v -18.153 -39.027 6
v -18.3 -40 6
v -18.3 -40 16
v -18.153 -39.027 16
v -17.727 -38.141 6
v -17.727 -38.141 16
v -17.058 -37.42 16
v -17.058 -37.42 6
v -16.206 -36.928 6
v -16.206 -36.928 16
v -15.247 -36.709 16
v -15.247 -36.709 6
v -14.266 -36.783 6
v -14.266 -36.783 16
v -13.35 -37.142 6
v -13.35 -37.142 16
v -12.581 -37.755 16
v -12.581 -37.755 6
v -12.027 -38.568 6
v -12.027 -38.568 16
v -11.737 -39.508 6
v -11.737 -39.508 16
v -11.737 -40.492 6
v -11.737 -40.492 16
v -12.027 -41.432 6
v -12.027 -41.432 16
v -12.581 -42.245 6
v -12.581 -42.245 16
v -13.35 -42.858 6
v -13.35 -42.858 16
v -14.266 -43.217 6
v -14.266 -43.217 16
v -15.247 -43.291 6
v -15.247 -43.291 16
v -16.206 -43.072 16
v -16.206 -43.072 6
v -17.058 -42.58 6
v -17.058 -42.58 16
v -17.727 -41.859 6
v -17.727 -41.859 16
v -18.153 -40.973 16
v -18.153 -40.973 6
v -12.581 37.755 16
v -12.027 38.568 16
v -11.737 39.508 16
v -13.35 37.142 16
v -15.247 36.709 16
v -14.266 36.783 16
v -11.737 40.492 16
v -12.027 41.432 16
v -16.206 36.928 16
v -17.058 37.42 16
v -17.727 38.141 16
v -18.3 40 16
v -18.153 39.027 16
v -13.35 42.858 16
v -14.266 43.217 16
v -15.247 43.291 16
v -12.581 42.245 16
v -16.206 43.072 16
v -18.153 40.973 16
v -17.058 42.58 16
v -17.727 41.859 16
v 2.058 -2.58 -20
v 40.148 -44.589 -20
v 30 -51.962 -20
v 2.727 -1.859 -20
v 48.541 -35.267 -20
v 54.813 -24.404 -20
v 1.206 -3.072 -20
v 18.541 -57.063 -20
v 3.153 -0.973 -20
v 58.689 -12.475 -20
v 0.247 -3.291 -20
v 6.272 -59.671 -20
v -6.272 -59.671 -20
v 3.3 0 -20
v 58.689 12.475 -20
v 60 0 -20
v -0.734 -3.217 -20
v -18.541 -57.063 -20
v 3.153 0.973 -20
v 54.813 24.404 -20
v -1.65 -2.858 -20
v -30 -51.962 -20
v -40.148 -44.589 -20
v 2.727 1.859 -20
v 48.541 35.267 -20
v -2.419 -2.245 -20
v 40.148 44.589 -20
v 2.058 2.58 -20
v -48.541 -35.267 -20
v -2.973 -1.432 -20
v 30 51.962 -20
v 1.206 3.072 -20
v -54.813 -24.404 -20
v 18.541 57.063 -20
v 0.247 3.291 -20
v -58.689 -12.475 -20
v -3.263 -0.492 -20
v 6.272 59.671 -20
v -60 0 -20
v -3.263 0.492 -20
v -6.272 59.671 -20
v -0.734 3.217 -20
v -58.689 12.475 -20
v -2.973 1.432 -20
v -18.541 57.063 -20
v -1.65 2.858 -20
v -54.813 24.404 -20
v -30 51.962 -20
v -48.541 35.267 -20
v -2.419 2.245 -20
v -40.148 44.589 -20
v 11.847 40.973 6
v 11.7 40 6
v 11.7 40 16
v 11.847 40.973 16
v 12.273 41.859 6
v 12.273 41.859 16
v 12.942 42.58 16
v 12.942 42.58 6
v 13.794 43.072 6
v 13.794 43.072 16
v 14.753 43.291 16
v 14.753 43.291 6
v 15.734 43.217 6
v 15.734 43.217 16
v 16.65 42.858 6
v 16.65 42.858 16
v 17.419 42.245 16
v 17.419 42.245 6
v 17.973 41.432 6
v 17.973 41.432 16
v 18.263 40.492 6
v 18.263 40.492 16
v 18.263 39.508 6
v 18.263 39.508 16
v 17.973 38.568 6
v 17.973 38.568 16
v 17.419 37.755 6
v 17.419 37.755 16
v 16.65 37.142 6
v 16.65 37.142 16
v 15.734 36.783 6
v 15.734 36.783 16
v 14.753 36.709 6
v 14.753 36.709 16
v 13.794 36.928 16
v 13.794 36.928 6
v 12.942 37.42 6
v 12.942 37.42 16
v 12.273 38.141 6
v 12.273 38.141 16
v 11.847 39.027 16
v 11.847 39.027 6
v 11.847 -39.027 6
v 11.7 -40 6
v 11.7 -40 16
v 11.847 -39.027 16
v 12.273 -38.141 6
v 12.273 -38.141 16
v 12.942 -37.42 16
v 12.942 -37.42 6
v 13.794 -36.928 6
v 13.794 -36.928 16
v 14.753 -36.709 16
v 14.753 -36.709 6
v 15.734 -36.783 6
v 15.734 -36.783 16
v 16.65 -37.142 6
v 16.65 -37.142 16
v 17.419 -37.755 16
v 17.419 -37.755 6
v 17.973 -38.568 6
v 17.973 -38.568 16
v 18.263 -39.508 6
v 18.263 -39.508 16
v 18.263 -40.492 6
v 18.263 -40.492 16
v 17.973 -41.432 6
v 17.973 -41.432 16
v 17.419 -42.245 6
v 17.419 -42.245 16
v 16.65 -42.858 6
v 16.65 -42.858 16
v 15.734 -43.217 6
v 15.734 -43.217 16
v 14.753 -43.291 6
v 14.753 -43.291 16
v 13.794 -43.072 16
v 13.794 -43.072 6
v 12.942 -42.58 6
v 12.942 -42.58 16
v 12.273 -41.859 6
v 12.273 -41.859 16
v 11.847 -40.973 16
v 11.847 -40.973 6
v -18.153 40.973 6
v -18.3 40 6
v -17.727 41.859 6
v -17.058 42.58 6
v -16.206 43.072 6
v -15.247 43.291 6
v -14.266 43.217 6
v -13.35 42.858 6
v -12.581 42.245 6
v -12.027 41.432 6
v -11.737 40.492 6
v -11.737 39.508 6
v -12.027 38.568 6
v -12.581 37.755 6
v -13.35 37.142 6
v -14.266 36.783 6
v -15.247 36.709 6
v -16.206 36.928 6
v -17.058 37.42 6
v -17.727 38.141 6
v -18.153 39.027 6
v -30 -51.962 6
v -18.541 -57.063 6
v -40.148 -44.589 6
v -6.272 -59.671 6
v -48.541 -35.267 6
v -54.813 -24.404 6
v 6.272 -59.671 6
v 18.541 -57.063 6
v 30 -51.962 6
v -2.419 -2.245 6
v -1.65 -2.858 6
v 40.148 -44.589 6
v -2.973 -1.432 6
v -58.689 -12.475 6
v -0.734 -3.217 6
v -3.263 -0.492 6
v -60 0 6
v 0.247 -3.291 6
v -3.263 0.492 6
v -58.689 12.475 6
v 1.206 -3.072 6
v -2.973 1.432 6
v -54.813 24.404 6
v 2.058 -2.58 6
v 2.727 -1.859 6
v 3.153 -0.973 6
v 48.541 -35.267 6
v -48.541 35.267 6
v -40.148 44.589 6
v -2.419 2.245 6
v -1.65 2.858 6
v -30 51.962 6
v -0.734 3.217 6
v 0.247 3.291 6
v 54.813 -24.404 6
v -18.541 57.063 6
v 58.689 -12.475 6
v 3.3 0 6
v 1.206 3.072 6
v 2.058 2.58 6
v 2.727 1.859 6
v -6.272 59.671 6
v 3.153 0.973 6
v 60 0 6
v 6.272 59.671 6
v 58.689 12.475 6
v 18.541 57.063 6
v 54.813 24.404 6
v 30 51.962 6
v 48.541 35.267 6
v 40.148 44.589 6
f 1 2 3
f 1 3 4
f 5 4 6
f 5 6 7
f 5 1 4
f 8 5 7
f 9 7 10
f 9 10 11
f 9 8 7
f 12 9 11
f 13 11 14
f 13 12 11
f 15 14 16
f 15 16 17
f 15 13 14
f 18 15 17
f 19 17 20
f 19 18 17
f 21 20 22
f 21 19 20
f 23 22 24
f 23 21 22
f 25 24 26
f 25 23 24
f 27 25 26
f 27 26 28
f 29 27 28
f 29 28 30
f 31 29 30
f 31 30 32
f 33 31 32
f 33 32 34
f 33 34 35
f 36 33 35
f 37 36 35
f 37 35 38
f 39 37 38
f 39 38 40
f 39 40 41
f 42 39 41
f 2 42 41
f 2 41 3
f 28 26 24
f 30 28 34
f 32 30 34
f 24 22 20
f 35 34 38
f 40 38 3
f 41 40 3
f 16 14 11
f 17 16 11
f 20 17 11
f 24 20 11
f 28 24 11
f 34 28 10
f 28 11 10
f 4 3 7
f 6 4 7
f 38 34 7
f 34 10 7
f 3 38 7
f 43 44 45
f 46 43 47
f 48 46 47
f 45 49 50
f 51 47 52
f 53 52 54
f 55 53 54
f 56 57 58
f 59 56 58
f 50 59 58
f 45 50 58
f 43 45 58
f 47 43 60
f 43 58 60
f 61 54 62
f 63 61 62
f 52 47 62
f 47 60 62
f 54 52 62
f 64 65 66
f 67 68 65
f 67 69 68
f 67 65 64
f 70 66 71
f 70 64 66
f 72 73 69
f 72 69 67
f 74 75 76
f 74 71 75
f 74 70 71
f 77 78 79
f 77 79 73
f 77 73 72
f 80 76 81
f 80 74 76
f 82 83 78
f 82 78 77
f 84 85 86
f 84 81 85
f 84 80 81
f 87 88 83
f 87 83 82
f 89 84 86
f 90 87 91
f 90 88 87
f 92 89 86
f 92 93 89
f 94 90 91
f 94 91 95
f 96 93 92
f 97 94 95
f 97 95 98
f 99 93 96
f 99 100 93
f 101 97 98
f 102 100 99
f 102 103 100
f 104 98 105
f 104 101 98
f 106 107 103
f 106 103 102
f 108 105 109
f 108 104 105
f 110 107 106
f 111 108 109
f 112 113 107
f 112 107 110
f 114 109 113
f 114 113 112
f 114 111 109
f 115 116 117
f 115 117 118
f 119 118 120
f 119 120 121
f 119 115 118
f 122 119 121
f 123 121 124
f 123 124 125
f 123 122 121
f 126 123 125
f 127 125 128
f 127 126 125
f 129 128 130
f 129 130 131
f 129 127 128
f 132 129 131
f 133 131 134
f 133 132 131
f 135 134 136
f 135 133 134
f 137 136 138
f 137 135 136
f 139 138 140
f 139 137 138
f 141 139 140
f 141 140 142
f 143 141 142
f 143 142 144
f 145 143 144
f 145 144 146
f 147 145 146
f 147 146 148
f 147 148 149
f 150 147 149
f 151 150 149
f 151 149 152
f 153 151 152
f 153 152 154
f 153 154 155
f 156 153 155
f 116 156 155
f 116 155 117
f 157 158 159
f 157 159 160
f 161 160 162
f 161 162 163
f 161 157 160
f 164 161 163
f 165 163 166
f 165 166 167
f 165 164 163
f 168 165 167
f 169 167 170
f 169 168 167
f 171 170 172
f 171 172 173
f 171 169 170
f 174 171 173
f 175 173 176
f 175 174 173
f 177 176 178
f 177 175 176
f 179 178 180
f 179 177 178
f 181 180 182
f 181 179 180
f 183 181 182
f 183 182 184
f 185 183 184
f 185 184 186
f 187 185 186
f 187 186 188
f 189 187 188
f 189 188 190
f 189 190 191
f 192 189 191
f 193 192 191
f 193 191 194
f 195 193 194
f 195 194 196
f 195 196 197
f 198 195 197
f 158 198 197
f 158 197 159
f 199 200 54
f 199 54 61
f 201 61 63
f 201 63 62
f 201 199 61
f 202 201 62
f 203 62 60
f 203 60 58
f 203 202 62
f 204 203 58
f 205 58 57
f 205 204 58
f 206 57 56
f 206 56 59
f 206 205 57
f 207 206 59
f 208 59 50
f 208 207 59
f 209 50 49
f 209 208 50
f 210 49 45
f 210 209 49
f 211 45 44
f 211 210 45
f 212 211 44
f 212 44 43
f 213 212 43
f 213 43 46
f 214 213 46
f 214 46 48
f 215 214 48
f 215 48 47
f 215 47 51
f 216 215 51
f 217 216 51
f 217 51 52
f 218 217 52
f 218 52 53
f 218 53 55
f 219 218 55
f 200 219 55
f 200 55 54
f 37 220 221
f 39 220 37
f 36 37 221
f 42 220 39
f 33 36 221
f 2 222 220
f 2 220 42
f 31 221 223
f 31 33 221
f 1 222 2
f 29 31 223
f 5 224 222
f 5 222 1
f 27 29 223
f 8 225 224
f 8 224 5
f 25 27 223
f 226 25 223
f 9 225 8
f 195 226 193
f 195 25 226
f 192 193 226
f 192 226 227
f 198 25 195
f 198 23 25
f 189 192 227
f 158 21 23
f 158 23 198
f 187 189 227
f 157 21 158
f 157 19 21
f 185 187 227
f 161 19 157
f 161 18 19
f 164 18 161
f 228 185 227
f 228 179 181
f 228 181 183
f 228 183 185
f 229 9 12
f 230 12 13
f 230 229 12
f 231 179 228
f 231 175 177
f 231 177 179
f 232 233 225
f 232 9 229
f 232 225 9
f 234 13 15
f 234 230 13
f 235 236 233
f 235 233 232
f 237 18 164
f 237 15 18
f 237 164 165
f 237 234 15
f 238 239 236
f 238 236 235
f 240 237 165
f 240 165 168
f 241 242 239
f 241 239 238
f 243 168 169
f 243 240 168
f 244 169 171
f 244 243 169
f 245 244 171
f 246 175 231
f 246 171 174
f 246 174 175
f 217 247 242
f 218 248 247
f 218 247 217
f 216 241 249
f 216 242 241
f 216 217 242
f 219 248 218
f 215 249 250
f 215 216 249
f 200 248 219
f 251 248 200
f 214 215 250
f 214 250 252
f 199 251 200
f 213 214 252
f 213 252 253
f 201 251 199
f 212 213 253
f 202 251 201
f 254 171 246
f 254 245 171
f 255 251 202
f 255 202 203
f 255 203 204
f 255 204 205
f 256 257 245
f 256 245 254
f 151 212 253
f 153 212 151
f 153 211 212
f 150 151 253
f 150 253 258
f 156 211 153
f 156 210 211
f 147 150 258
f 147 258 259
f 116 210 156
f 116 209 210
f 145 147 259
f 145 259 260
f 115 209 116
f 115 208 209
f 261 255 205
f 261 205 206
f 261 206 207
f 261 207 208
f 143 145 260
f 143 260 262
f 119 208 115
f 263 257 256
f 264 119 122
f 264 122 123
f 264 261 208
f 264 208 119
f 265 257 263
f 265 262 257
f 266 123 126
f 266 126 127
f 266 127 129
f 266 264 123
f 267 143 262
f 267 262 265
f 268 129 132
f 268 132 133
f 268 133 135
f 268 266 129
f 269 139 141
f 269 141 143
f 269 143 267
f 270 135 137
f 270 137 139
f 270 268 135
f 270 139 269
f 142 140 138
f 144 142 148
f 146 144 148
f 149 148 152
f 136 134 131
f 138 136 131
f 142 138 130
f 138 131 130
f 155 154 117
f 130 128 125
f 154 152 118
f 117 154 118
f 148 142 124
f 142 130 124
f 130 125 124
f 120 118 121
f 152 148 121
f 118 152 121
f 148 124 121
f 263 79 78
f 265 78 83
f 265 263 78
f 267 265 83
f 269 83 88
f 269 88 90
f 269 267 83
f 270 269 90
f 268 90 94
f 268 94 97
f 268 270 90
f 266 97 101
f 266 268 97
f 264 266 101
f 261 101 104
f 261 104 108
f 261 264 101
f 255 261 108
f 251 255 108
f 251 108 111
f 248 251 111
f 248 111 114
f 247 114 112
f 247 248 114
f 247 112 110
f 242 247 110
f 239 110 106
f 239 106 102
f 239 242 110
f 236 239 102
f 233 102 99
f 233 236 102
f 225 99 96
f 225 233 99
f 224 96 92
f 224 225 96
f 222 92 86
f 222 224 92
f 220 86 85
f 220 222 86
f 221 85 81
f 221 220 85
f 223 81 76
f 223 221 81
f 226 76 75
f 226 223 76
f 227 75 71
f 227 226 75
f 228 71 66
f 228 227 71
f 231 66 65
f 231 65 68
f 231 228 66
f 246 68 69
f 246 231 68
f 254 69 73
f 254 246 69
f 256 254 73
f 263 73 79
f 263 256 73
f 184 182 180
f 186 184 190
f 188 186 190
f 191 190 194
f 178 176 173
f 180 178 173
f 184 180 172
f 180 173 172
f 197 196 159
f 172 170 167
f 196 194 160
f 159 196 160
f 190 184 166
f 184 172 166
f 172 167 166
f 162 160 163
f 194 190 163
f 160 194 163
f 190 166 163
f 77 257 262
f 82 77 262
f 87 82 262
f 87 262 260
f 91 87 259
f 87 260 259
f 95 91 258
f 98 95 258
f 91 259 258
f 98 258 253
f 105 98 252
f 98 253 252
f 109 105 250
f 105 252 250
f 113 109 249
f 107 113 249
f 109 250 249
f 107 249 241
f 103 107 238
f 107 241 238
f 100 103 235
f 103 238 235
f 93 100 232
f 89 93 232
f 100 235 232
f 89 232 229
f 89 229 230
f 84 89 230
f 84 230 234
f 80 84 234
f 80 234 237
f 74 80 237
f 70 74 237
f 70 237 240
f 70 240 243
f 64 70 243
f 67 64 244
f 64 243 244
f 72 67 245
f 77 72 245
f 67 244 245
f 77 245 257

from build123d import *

# Parameters (mm, degrees)
SKETCH_1_R      = 60
SKETCH_1_R_2    = 3.3
EXTRUDE_1_DEPTH = 26
SKETCH_2_R      = 3.3
EXTRUDE_2_DEPTH = 36


with BuildPart() as part:
    # 草图1 → 凸台-拉伸1 (new body)
    with BuildSketch(Plane.XY.offset(6)):
        Circle(SKETCH_1_R)
        Circle(SKETCH_1_R_2, mode=Mode.SUBTRACT)
    extrude(amount=-EXTRUDE_1_DEPTH)

    # 草图2 → 凸台-拉伸2 (add)
    with BuildSketch(Plane(origin=(0, 0, -20), x_dir=(-1, 0, 0), z_dir=(0, 0, -1))):
        with Locations((-14.999999495, 40)):
            Circle(SKETCH_2_R)
        with Locations((14.999999495, 40)):
            Circle(SKETCH_2_R)
        with Locations((-14.999999495, -40)):
            Circle(SKETCH_2_R)
        with Locations((14.999999495, -40)):
            Circle(SKETCH_2_R)
    extrude(amount=-EXTRUDE_2_DEPTH)


solid = part.part
